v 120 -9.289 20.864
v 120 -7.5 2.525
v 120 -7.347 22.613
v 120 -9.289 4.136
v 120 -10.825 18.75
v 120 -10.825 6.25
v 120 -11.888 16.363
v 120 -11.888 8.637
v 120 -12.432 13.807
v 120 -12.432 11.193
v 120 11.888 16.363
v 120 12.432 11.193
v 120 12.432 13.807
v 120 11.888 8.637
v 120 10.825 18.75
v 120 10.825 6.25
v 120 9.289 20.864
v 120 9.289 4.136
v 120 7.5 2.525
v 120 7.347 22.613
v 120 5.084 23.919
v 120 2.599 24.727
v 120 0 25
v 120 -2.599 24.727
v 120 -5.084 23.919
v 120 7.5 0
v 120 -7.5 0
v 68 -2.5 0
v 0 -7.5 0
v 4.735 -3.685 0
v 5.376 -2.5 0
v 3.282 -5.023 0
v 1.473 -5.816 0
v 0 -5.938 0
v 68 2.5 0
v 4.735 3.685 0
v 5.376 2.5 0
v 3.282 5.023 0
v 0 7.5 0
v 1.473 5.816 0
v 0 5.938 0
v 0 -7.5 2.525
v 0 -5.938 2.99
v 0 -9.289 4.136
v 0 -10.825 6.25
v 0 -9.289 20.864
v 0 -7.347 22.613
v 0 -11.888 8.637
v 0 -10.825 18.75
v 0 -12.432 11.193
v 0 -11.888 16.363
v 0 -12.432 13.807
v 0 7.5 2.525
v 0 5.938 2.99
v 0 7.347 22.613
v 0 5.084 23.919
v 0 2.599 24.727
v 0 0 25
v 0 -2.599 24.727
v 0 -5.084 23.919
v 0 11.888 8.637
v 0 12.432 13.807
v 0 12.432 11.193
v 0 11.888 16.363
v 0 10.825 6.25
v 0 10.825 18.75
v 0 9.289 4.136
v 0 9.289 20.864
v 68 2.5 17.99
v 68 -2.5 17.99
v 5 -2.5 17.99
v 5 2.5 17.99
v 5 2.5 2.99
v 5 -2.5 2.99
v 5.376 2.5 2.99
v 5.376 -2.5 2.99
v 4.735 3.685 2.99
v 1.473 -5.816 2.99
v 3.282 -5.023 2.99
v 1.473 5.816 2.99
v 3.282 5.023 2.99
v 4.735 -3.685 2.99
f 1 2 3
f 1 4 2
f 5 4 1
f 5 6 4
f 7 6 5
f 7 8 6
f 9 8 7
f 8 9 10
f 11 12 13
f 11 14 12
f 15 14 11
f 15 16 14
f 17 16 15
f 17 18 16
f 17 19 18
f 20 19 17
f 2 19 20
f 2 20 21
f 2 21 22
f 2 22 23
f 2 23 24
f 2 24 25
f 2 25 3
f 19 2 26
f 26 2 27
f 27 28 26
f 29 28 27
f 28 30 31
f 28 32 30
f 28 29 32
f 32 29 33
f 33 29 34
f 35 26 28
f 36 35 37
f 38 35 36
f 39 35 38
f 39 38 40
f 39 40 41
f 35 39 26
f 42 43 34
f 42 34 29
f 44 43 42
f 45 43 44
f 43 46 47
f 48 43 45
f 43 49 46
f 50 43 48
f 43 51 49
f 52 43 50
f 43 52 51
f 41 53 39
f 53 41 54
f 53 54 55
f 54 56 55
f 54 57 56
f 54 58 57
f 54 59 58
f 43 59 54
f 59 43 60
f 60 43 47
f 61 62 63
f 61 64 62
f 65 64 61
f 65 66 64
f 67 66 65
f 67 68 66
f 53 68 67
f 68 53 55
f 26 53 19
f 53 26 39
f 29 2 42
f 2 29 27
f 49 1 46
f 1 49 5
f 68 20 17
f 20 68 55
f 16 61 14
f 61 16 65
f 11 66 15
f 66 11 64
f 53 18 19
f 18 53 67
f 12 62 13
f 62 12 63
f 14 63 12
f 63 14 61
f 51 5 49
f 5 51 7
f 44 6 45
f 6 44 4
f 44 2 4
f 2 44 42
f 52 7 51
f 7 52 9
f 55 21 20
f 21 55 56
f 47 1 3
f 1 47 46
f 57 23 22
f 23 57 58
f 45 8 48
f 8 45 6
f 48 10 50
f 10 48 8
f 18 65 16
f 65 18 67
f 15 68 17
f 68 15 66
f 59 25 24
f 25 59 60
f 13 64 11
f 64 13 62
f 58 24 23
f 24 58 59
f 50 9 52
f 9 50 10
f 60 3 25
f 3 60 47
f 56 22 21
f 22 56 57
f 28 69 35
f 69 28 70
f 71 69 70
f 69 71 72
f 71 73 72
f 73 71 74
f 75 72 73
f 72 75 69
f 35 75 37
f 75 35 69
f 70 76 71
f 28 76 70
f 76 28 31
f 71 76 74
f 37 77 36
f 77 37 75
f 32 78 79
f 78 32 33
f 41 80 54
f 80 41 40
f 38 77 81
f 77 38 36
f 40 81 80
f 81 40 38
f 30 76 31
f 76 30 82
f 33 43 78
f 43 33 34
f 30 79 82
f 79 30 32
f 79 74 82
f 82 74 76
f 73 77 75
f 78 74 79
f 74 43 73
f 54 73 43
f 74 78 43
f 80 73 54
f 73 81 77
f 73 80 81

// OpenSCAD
epsilon = 0.01; epislo2 = epsilon*2;
slot_width = 5;
slot_length = 63;
slot_height = 18;
slot_offset = 5;
circle_height = 3;
circle_width = 12;
circle_offset = 0;
base_width = 15;
base_length = 120;
pivot_off_handle = 0;
pivot_off_base = 5;
base_off_x = (base_length-(slot_length+pivot_off_base));
handle_dia = 25;
handle_len = base_length;
handle_off_x = (handle_len-(slot_length-pivot_off_handle));
handle_off_z = handle_dia/2;

difference() {
    union() {
        translate([0, -base_width/2, 0]) cube([base_length, base_width, slot_height]);
        translate([0, 0, handle_off_z]) rotate([0, 90, 0])
          cylinder(h=handle_len, d=handle_dia);
    }
    translate([slot_offset, -slot_width/2, -epsilon])
      cube([slot_length, slot_width, slot_height]);
    translate([circle_offset, 0, -epsilon]) cylinder(h=circle_height, d=circle_width);
}
